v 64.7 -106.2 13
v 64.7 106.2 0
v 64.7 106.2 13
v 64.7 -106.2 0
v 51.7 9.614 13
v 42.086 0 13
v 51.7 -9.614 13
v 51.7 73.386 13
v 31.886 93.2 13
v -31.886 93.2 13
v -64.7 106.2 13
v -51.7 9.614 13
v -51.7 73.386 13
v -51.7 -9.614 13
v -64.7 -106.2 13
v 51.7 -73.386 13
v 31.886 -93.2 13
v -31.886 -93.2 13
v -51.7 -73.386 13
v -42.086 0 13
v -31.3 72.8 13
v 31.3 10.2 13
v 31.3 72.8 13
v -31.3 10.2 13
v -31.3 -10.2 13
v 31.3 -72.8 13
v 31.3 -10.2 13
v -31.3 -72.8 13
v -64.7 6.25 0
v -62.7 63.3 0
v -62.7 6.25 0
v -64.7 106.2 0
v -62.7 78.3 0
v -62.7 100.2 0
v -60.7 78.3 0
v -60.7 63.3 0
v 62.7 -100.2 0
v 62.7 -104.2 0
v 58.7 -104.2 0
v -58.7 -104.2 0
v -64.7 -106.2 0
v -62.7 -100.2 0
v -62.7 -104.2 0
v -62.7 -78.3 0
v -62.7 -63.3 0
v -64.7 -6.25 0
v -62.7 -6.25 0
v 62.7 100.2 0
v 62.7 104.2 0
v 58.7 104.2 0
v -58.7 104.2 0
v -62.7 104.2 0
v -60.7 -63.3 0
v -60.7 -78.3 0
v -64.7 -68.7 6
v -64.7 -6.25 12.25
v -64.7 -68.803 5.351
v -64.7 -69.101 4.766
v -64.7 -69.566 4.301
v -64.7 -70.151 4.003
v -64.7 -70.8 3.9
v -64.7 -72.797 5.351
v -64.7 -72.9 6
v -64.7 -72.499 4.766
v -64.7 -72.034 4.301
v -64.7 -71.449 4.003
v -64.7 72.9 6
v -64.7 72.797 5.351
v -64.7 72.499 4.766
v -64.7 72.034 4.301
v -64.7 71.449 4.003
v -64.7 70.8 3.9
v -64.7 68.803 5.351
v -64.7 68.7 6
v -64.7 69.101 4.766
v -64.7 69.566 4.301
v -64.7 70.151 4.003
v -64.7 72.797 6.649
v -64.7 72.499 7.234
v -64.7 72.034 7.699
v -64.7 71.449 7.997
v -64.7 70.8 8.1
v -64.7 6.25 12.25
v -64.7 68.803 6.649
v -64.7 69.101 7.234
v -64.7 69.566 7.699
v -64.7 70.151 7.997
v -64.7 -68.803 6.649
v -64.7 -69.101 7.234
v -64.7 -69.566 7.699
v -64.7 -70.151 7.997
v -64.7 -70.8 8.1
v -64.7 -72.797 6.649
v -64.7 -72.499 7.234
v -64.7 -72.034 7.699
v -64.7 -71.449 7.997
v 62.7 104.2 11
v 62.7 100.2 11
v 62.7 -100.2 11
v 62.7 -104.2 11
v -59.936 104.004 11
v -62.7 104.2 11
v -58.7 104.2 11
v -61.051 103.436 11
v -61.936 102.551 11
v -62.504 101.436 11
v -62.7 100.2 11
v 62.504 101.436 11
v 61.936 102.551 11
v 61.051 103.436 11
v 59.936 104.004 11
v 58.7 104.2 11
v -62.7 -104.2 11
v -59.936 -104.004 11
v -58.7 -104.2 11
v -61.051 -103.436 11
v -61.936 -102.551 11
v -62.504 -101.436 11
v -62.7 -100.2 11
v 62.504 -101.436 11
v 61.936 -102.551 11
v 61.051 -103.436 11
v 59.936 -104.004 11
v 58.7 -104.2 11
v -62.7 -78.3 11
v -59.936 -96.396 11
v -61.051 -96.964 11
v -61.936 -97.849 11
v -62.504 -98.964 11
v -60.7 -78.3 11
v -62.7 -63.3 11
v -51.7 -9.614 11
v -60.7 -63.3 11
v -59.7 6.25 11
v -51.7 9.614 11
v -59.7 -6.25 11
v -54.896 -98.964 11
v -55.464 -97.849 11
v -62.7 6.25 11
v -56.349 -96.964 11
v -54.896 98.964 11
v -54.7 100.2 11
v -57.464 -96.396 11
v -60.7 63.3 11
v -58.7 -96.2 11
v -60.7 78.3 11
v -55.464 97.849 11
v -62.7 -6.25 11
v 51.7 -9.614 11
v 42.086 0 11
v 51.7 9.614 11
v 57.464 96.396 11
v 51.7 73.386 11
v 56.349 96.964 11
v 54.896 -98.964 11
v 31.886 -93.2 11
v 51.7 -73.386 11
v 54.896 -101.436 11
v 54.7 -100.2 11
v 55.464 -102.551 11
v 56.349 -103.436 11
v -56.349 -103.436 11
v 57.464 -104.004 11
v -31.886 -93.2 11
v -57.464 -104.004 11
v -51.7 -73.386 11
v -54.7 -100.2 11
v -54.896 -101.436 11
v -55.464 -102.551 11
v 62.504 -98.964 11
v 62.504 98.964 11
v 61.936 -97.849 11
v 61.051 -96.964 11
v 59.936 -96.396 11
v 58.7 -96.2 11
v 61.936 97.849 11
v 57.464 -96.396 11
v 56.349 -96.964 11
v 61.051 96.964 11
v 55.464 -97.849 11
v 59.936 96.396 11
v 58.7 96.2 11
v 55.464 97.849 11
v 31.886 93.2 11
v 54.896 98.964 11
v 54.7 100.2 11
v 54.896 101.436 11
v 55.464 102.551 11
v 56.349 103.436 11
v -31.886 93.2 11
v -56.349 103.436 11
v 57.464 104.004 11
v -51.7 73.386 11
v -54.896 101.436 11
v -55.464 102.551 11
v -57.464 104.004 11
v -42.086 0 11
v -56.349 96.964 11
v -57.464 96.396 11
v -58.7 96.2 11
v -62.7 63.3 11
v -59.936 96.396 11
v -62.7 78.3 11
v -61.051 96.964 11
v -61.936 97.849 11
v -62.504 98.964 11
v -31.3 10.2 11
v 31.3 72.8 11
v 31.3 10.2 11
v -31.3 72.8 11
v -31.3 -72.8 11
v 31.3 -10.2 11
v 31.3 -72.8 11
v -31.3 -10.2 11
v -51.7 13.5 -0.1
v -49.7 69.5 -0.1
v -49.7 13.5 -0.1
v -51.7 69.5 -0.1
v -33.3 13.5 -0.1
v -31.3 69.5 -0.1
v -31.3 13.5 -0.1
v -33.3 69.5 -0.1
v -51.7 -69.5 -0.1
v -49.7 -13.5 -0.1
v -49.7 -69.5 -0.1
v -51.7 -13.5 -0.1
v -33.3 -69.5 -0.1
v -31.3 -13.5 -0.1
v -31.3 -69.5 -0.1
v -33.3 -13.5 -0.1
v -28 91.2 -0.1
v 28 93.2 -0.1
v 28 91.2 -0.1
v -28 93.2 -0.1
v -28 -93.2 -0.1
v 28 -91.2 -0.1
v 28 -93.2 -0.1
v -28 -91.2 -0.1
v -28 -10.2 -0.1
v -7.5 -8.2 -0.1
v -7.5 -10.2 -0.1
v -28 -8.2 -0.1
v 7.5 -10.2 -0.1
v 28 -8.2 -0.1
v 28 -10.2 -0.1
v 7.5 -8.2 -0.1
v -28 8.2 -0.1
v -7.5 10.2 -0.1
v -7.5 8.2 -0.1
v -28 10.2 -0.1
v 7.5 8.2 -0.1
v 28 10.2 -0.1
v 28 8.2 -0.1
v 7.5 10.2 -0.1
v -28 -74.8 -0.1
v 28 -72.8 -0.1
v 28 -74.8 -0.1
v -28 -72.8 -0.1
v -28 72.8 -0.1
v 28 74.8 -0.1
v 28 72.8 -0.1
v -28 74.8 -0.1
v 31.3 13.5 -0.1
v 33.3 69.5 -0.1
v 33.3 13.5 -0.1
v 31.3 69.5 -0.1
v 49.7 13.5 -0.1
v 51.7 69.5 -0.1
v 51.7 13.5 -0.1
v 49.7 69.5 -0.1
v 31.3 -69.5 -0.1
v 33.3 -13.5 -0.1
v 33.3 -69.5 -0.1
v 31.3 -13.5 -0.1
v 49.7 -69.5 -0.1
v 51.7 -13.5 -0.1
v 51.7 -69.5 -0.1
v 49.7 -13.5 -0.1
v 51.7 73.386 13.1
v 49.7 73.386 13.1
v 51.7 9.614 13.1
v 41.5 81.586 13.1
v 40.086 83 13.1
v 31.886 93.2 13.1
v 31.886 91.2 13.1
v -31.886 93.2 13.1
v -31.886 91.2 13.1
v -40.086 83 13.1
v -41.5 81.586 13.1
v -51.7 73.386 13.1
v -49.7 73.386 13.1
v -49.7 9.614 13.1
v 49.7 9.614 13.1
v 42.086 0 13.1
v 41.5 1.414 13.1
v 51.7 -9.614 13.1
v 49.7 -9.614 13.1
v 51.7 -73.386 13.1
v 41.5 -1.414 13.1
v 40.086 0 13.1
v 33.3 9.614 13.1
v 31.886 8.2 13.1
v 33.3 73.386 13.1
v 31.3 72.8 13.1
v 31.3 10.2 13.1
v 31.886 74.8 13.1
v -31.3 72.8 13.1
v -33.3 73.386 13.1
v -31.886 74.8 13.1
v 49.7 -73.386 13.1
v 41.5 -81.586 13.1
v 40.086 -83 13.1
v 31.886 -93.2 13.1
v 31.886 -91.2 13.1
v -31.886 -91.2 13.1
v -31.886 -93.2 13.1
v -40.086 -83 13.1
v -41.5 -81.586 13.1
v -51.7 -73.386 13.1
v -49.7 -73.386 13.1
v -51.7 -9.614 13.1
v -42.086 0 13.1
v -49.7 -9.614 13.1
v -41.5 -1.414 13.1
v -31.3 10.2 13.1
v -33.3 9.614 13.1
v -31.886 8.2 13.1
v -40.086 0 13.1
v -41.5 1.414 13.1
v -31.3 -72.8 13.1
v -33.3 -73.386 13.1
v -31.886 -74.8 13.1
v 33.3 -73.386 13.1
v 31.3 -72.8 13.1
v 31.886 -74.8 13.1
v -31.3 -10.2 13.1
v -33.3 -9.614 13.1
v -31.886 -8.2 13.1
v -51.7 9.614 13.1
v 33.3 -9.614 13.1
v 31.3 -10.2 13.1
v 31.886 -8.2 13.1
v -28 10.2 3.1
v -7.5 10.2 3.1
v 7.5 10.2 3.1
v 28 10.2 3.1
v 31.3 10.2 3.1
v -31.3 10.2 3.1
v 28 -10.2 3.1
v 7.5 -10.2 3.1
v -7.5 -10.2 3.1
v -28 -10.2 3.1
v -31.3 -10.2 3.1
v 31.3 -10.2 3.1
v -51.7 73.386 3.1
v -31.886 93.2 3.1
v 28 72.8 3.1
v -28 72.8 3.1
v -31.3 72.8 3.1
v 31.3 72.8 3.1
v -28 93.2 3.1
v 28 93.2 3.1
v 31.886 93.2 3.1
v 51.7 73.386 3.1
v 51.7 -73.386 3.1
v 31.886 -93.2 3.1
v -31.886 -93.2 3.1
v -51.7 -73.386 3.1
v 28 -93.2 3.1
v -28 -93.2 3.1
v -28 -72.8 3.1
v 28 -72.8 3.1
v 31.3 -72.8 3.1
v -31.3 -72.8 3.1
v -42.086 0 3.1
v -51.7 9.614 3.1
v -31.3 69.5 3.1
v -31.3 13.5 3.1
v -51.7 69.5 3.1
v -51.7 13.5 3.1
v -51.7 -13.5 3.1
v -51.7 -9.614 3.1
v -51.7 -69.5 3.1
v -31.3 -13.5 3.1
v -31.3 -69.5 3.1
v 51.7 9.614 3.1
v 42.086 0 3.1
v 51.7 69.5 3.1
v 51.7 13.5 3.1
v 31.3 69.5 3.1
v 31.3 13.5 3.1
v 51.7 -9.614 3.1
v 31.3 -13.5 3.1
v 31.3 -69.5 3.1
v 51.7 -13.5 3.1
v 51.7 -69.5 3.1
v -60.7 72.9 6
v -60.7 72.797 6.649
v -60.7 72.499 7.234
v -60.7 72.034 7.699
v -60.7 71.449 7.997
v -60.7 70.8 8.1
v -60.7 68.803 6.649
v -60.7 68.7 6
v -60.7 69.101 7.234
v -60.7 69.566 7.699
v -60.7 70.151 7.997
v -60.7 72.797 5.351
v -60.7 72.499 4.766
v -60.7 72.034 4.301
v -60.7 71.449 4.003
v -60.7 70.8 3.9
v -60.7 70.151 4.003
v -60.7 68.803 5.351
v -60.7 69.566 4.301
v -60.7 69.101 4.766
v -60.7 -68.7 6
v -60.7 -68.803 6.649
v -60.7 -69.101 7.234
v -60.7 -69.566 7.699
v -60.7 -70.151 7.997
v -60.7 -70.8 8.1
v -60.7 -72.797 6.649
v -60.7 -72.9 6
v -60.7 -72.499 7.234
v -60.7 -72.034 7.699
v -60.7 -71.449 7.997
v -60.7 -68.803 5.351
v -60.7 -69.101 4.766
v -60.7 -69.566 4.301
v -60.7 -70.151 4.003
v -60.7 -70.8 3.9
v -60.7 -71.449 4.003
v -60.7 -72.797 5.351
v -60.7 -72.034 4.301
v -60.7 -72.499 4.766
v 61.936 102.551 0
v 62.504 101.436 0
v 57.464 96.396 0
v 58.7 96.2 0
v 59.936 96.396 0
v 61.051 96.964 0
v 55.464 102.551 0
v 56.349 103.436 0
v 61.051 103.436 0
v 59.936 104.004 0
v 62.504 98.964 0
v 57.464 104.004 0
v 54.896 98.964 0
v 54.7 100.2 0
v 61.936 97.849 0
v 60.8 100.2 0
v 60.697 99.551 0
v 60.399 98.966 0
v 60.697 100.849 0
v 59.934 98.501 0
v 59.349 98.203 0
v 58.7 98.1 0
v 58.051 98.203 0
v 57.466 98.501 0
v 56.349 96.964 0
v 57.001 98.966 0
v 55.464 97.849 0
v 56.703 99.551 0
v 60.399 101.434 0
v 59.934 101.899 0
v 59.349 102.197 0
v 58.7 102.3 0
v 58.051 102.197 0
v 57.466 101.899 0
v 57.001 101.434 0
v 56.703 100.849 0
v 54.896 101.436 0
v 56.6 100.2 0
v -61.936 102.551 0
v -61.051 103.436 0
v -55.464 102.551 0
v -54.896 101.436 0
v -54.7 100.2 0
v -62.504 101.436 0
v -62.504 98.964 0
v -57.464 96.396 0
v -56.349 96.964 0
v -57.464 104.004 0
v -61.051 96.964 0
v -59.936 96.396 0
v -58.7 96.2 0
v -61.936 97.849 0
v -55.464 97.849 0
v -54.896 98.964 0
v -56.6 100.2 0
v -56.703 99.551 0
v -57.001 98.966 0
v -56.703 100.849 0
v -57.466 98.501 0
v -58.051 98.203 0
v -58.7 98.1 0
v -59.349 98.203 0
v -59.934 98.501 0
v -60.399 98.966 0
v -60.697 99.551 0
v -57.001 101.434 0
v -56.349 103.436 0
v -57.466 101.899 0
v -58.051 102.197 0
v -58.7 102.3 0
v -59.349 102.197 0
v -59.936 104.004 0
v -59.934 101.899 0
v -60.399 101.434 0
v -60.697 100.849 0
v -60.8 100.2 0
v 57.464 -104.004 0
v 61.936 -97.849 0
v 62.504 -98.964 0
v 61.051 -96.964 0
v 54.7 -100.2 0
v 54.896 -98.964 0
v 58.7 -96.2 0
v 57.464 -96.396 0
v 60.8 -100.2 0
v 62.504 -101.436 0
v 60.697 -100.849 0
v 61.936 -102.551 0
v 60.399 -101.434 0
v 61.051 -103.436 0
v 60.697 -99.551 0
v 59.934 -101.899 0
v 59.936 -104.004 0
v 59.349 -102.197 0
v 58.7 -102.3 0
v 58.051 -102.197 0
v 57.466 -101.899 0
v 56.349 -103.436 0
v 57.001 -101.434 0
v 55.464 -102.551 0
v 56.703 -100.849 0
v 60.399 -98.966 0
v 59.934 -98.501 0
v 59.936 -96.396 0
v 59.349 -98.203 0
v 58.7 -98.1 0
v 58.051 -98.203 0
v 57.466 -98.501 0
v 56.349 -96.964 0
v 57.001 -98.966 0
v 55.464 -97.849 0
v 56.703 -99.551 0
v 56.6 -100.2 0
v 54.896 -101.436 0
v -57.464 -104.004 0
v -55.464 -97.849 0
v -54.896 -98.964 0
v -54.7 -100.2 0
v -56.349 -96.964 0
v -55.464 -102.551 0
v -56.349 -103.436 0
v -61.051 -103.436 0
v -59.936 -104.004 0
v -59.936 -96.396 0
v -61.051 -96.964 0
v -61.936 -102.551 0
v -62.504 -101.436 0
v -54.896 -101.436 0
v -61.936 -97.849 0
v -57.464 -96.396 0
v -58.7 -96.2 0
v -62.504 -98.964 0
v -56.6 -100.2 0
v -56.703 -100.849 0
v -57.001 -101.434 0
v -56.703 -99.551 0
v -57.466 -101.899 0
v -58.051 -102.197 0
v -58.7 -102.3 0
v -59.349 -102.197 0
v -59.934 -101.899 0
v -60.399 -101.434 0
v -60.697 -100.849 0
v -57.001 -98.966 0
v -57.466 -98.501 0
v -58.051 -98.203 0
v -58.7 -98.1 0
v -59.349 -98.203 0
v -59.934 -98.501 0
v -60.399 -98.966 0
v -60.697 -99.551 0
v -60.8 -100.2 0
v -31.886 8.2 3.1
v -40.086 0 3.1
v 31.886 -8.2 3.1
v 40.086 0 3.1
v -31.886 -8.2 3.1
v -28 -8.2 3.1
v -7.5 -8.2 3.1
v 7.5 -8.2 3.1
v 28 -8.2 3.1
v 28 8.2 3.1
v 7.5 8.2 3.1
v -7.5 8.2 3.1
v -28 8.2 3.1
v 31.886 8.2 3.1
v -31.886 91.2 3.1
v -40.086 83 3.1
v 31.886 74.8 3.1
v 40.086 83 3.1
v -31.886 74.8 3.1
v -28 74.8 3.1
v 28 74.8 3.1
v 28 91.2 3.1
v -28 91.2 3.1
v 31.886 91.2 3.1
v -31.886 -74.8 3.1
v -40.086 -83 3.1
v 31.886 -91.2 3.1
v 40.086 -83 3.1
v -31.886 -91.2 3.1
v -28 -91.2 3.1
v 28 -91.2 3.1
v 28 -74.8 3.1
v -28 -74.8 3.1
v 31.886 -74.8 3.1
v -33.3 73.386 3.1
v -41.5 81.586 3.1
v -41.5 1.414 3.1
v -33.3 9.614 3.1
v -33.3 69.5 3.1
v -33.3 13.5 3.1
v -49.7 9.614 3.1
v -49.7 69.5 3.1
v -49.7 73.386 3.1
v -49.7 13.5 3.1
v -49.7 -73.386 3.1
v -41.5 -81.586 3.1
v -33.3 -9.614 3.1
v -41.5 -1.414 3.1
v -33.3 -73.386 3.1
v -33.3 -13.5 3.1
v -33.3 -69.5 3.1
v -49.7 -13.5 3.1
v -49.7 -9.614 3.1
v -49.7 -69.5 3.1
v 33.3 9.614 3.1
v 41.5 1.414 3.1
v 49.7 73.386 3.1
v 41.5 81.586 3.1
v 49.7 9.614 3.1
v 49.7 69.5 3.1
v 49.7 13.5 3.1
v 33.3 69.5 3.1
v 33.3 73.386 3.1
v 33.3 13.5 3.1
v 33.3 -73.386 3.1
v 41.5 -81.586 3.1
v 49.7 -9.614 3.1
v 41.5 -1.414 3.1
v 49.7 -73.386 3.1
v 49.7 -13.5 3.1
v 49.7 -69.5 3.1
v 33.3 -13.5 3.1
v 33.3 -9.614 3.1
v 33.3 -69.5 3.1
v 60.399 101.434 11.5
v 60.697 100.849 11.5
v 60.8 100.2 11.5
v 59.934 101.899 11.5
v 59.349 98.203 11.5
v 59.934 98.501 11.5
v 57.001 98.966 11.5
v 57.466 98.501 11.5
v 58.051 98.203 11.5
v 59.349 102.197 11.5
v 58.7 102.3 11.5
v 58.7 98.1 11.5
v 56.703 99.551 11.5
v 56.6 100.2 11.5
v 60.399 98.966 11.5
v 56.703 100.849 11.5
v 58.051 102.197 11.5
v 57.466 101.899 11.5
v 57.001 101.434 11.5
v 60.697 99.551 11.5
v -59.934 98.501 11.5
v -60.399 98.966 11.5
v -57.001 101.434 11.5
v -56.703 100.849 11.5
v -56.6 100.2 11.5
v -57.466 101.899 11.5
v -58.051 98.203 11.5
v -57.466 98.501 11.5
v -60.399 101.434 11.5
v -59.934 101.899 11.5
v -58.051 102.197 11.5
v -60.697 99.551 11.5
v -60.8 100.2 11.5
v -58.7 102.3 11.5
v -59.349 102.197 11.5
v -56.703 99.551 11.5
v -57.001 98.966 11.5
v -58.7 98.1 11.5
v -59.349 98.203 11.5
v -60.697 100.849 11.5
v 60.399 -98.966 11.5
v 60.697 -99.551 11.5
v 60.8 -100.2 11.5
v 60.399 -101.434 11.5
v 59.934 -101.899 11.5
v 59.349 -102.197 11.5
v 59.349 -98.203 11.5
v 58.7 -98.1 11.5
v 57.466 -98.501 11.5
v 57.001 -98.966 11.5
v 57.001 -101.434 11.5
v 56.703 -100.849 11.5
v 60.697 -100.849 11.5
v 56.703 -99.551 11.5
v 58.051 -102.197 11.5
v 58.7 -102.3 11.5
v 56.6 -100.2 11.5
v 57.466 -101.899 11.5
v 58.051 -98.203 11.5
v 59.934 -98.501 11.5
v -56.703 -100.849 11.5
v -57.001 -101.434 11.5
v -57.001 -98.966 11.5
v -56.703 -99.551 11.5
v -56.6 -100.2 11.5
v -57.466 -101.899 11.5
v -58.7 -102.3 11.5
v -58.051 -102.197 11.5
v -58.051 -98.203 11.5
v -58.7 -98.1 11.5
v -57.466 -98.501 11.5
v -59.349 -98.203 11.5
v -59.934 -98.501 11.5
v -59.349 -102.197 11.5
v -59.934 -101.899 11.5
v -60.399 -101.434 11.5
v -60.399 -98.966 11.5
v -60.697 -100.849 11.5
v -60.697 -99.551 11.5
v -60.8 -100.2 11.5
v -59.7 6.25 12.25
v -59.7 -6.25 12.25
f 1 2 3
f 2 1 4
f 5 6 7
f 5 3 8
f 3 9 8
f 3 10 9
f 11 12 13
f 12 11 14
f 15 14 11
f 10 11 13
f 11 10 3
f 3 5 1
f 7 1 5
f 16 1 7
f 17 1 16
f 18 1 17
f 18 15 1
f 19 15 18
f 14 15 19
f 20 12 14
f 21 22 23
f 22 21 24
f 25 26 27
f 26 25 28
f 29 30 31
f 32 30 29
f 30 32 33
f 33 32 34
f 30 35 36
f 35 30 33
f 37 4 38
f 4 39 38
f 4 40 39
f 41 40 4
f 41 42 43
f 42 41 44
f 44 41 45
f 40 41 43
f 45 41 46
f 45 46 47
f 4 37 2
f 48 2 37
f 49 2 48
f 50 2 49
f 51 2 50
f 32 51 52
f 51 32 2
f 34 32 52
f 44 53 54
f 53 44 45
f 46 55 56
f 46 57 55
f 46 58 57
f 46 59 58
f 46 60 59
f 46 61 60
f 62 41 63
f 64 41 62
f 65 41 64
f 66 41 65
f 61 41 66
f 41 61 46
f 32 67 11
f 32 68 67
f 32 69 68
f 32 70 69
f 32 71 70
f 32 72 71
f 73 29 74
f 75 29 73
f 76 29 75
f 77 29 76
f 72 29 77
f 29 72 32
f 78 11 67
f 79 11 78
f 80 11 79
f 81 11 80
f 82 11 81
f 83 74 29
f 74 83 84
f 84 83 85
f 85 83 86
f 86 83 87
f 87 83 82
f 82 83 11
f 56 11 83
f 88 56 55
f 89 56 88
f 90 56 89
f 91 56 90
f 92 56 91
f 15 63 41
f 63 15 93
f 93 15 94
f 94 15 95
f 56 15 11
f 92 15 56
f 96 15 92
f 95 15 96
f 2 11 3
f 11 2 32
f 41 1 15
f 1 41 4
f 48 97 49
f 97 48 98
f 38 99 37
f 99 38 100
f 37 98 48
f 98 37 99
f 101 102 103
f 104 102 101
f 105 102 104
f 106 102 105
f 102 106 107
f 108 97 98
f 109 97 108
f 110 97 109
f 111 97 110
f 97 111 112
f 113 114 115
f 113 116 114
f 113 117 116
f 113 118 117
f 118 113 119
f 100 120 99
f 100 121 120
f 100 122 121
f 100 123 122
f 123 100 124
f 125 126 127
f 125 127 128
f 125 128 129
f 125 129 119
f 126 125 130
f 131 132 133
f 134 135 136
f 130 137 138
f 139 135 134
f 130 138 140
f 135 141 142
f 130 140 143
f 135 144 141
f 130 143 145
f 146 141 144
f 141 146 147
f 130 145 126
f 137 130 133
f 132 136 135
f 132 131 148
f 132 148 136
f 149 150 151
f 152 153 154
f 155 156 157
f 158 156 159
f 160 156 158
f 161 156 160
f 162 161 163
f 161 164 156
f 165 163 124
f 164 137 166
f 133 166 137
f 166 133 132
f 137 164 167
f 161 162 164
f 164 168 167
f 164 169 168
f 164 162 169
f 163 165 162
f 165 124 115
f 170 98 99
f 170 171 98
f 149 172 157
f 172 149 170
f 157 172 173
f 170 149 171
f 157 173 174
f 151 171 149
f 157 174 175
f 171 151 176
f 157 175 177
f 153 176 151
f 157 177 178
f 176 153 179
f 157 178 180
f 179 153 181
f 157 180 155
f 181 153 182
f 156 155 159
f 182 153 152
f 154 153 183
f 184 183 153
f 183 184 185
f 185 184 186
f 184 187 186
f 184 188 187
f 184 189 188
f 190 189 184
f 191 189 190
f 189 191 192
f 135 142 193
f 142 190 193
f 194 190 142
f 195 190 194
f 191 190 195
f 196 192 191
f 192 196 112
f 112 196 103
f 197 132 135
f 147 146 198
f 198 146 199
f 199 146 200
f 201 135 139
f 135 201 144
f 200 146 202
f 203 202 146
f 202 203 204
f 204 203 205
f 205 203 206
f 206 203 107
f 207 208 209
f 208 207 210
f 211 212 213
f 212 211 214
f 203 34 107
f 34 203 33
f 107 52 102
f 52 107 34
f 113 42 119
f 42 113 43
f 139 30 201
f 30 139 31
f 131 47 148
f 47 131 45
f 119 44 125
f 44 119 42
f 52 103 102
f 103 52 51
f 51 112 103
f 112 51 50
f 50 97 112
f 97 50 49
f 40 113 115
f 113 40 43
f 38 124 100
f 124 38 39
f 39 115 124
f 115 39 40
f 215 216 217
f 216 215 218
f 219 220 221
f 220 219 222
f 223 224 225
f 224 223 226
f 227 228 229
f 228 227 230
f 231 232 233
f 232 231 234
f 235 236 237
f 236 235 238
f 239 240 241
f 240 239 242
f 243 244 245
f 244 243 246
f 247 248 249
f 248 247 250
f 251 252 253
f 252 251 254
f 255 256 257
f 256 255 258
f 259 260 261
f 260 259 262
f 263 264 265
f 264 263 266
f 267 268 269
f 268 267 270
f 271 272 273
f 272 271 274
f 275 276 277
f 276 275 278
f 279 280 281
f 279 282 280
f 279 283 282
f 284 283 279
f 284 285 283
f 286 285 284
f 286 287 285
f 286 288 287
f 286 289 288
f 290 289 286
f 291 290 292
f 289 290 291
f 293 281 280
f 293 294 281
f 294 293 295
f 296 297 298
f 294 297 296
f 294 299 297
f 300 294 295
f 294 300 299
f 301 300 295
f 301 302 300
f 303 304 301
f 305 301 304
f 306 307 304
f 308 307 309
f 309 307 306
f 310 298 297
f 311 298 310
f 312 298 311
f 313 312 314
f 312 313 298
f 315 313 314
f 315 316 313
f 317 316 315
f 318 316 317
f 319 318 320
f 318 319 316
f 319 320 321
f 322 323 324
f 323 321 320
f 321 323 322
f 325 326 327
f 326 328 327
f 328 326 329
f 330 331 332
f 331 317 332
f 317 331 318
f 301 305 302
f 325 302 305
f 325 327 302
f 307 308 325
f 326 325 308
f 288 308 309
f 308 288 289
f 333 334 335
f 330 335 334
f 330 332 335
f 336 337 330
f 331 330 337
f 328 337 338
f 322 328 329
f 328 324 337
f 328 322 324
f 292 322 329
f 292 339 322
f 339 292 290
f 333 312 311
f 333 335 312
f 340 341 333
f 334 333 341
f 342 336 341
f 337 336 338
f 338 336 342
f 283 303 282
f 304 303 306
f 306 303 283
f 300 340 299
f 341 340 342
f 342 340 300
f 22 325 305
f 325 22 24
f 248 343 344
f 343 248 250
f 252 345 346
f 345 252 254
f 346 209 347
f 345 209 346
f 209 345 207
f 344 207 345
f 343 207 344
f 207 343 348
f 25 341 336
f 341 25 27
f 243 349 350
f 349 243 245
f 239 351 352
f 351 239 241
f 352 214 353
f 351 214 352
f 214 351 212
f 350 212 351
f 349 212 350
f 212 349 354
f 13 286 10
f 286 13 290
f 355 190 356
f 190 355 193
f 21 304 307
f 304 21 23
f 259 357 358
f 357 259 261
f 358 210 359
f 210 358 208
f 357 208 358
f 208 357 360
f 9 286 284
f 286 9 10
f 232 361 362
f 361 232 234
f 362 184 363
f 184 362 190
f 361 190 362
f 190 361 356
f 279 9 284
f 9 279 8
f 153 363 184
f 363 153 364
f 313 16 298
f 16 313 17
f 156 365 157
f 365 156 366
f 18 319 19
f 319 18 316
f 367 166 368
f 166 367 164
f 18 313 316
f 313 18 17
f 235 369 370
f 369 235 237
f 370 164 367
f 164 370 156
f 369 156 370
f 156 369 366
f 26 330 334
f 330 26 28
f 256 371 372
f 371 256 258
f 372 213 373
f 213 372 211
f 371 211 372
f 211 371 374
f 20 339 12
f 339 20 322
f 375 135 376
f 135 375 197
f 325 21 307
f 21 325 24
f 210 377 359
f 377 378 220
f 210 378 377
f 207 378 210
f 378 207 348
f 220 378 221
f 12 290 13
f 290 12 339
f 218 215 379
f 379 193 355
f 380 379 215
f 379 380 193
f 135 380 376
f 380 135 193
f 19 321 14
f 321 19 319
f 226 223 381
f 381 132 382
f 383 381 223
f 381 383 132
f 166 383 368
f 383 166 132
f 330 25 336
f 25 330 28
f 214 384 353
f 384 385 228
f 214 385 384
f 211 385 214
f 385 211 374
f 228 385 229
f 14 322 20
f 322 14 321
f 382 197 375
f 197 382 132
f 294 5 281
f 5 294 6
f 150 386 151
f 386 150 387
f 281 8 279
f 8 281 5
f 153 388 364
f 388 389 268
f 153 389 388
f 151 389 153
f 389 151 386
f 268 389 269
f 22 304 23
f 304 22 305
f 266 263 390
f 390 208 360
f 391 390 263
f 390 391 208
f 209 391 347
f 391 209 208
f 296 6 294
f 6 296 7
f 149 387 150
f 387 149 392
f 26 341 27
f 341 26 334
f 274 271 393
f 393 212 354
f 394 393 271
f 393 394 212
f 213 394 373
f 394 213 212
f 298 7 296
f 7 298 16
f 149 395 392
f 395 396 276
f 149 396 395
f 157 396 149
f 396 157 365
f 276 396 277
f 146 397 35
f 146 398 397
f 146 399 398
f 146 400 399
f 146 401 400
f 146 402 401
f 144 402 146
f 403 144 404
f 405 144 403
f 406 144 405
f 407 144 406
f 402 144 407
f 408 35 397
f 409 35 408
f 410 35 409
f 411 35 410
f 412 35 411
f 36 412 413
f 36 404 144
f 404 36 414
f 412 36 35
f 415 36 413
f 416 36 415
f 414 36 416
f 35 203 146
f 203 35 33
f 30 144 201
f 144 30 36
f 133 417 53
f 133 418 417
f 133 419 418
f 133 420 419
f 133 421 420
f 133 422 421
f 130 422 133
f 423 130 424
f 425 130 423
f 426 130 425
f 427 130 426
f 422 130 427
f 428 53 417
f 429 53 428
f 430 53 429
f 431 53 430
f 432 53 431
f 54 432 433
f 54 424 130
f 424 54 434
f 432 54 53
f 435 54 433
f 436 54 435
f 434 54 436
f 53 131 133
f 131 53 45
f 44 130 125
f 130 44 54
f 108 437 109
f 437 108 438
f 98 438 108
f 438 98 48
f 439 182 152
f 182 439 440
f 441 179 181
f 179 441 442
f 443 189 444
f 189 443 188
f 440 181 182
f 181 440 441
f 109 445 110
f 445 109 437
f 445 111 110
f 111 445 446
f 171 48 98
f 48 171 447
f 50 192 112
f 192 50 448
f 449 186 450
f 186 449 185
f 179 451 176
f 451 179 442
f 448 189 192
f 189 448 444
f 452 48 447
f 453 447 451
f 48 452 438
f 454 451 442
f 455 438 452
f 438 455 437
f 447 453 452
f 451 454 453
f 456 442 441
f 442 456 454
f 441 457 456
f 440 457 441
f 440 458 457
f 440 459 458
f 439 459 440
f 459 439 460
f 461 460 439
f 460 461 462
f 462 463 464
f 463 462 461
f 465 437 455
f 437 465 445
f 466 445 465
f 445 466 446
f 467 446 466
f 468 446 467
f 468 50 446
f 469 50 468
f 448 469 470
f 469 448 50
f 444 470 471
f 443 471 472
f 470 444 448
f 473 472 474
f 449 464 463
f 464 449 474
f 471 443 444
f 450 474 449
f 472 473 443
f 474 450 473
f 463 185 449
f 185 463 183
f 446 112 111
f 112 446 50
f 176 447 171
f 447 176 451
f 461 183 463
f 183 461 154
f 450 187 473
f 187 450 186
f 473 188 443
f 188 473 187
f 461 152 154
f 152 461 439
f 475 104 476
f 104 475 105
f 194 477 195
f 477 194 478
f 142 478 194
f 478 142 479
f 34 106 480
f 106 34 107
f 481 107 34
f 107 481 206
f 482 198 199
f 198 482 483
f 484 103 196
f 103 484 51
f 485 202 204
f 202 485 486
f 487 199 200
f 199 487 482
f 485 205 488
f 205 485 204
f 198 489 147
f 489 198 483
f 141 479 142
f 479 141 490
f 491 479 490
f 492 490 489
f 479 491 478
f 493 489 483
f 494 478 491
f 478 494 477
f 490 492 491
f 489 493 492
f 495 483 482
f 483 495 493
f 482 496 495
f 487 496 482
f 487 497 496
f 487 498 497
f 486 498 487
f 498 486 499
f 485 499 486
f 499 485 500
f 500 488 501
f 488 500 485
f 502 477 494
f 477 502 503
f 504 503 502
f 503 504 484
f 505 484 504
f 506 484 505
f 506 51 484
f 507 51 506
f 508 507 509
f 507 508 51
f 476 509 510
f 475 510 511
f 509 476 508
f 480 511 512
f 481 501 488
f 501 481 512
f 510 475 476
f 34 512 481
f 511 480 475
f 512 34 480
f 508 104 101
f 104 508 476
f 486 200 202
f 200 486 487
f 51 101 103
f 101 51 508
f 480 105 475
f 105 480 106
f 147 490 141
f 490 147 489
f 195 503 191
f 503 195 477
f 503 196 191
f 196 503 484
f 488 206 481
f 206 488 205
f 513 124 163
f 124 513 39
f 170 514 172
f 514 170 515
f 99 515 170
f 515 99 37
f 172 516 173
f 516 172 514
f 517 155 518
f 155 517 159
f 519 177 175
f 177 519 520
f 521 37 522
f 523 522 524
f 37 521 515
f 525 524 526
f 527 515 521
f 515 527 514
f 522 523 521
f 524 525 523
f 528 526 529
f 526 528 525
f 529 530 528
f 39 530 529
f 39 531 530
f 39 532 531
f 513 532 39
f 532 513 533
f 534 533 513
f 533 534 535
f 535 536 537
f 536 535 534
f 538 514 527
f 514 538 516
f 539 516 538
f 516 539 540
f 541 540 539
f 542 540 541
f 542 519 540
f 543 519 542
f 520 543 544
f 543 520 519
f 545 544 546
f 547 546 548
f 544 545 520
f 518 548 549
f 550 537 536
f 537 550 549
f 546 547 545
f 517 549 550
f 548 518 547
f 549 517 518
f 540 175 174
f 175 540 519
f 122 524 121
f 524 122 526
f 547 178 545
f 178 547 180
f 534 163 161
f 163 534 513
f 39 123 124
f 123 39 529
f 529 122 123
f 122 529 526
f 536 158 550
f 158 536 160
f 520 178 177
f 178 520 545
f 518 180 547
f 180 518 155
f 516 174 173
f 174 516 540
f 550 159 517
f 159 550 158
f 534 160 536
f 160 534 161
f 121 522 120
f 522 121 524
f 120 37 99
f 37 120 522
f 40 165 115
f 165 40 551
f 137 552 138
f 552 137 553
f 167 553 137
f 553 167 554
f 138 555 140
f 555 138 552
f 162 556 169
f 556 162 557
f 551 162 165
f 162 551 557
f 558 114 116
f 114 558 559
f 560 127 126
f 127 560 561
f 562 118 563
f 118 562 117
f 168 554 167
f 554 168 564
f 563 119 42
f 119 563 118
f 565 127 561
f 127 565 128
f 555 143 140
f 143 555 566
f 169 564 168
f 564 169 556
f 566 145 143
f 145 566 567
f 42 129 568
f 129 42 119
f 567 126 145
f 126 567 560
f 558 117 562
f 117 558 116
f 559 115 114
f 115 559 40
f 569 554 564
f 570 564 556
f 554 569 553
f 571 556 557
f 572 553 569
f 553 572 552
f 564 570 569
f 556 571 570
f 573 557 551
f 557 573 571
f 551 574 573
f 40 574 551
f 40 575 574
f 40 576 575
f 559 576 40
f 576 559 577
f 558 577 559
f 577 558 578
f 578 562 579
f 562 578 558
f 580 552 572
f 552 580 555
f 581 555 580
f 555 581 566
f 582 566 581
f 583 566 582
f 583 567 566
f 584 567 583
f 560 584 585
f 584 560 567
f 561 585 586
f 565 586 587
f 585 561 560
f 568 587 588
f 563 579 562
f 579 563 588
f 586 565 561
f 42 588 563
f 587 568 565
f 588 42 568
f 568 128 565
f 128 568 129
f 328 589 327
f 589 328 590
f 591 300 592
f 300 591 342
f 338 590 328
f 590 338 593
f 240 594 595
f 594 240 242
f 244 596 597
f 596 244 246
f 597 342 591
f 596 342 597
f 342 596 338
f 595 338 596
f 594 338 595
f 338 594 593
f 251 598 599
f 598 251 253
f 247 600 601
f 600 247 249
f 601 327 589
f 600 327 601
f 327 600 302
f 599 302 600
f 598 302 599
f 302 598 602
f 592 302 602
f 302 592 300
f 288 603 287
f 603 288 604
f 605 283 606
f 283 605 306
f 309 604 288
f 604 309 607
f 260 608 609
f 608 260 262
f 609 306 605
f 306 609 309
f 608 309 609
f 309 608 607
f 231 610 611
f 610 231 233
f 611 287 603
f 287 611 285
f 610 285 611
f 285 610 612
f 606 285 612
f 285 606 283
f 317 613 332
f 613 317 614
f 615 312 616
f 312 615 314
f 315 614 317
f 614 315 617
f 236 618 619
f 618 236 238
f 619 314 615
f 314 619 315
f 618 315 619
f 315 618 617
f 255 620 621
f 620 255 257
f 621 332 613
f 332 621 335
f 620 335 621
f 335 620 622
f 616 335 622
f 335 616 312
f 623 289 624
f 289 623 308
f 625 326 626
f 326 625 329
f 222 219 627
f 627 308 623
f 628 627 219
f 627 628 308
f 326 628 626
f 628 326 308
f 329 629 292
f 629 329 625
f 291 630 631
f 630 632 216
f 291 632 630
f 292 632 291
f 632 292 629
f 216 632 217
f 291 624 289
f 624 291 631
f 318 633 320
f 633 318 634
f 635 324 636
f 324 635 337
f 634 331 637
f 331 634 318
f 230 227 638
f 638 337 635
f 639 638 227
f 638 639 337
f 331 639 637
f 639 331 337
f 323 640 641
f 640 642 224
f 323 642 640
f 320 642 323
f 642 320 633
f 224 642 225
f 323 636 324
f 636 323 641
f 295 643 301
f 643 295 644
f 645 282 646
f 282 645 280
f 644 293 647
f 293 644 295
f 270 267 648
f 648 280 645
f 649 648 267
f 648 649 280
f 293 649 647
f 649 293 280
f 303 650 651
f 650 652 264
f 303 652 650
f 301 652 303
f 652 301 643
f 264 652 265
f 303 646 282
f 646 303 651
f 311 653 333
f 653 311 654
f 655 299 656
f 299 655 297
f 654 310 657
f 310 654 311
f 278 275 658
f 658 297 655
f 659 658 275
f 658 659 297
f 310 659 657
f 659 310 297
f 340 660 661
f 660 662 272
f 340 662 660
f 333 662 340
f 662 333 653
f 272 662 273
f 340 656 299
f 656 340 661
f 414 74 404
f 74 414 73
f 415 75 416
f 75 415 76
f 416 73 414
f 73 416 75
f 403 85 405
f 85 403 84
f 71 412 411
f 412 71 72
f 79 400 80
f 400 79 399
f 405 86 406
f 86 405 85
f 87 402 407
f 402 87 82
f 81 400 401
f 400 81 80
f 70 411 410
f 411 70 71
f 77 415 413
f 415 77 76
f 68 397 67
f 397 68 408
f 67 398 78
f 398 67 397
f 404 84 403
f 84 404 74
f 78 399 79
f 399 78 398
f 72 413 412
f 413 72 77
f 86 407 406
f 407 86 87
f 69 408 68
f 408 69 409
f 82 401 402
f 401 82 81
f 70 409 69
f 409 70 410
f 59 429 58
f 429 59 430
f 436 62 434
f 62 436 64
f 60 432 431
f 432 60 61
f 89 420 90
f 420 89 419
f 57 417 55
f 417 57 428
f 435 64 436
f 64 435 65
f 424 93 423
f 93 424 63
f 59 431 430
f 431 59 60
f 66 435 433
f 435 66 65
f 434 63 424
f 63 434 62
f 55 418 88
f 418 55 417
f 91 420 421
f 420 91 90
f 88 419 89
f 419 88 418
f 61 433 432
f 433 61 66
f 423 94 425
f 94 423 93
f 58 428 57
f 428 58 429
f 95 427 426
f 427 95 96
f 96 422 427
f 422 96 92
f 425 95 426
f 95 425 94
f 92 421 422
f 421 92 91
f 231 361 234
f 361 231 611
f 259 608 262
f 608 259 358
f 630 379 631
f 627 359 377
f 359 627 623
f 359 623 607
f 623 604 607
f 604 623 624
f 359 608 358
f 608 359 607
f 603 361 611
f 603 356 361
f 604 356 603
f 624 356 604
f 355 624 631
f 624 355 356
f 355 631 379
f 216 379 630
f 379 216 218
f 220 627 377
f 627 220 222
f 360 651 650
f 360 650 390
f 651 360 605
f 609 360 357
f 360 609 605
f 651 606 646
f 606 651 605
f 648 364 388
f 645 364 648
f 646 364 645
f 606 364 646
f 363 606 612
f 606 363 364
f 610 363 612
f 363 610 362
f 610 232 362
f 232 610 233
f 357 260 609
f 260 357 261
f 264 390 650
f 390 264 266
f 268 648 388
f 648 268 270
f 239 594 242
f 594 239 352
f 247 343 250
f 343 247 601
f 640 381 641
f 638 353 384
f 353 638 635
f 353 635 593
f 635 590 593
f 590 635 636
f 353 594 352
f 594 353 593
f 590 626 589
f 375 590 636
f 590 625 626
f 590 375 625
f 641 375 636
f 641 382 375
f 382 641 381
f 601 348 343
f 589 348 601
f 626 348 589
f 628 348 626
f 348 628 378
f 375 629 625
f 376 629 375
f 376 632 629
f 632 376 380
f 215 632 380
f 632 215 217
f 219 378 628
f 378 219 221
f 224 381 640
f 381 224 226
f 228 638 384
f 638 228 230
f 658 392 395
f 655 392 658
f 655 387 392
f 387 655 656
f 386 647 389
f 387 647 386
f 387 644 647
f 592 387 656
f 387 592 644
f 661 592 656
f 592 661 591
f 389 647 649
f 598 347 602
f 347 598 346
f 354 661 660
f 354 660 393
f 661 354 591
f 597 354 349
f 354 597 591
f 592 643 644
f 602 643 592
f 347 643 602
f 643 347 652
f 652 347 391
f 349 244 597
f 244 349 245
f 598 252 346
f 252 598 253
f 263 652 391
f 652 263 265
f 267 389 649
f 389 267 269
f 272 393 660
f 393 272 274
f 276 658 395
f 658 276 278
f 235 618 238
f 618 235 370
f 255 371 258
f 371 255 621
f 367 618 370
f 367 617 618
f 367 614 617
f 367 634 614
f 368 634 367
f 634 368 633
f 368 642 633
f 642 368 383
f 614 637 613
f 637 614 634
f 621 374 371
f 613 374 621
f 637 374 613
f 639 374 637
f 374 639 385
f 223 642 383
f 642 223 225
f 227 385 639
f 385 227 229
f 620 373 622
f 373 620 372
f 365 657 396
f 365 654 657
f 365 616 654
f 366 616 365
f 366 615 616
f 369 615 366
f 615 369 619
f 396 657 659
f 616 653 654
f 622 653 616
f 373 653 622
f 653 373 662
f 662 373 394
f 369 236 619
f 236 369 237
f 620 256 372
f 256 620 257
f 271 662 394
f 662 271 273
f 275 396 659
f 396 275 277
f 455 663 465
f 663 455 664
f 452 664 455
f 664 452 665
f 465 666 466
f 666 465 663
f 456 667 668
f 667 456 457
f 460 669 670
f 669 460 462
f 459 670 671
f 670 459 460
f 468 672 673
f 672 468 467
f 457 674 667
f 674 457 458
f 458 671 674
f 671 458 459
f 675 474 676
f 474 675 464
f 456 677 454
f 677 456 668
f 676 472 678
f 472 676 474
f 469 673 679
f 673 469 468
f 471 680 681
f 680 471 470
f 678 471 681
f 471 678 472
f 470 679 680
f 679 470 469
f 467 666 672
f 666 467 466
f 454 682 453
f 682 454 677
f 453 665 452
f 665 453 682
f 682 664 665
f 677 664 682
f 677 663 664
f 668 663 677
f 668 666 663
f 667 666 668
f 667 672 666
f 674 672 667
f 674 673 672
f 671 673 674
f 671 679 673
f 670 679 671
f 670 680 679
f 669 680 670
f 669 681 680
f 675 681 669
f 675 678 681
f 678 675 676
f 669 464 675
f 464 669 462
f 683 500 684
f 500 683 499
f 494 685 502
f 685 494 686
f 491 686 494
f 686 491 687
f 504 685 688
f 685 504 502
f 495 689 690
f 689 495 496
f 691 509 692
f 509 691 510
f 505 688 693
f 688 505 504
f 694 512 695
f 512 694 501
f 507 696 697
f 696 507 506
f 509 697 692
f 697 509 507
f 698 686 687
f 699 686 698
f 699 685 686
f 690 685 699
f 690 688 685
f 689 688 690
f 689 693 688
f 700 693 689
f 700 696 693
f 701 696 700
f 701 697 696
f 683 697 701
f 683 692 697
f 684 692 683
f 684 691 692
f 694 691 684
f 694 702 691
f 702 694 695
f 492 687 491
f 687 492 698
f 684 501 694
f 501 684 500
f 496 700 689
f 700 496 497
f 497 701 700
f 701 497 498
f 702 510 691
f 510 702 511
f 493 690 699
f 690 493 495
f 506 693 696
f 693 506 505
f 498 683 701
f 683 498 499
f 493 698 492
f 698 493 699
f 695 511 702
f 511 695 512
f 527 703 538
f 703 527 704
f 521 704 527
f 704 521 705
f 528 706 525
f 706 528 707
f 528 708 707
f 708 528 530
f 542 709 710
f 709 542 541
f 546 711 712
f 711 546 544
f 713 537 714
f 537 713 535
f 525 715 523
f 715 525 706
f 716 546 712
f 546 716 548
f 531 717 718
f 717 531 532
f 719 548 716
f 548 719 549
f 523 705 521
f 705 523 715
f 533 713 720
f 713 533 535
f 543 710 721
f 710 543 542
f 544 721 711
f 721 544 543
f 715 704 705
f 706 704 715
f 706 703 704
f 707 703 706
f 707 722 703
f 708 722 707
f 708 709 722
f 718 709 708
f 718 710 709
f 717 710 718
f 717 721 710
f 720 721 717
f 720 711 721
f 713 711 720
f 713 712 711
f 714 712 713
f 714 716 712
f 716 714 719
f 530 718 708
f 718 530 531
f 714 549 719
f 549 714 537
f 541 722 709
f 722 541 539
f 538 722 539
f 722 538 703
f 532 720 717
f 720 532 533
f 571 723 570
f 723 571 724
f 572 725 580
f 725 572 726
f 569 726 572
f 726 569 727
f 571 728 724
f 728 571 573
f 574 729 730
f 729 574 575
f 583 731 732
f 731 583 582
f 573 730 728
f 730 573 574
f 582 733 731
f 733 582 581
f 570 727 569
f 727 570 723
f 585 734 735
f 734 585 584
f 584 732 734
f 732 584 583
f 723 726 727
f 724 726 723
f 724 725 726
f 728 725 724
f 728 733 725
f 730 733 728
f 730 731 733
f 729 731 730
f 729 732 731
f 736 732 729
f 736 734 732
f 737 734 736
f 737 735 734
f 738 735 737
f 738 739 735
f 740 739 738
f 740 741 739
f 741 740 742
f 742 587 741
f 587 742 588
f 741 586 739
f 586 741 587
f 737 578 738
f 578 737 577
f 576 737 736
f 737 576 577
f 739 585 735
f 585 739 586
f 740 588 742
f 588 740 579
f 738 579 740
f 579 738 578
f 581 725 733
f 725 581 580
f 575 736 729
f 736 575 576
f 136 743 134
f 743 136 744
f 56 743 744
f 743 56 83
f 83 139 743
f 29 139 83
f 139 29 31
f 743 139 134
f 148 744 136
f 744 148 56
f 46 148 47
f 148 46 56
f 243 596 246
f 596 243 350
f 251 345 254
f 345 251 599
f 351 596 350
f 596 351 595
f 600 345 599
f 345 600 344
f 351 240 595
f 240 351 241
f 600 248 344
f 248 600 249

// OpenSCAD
use <7segment_v2.scad>

// Render just the black frontplate so the user can see the updated margins
color("DimGray") frontplate_black();
